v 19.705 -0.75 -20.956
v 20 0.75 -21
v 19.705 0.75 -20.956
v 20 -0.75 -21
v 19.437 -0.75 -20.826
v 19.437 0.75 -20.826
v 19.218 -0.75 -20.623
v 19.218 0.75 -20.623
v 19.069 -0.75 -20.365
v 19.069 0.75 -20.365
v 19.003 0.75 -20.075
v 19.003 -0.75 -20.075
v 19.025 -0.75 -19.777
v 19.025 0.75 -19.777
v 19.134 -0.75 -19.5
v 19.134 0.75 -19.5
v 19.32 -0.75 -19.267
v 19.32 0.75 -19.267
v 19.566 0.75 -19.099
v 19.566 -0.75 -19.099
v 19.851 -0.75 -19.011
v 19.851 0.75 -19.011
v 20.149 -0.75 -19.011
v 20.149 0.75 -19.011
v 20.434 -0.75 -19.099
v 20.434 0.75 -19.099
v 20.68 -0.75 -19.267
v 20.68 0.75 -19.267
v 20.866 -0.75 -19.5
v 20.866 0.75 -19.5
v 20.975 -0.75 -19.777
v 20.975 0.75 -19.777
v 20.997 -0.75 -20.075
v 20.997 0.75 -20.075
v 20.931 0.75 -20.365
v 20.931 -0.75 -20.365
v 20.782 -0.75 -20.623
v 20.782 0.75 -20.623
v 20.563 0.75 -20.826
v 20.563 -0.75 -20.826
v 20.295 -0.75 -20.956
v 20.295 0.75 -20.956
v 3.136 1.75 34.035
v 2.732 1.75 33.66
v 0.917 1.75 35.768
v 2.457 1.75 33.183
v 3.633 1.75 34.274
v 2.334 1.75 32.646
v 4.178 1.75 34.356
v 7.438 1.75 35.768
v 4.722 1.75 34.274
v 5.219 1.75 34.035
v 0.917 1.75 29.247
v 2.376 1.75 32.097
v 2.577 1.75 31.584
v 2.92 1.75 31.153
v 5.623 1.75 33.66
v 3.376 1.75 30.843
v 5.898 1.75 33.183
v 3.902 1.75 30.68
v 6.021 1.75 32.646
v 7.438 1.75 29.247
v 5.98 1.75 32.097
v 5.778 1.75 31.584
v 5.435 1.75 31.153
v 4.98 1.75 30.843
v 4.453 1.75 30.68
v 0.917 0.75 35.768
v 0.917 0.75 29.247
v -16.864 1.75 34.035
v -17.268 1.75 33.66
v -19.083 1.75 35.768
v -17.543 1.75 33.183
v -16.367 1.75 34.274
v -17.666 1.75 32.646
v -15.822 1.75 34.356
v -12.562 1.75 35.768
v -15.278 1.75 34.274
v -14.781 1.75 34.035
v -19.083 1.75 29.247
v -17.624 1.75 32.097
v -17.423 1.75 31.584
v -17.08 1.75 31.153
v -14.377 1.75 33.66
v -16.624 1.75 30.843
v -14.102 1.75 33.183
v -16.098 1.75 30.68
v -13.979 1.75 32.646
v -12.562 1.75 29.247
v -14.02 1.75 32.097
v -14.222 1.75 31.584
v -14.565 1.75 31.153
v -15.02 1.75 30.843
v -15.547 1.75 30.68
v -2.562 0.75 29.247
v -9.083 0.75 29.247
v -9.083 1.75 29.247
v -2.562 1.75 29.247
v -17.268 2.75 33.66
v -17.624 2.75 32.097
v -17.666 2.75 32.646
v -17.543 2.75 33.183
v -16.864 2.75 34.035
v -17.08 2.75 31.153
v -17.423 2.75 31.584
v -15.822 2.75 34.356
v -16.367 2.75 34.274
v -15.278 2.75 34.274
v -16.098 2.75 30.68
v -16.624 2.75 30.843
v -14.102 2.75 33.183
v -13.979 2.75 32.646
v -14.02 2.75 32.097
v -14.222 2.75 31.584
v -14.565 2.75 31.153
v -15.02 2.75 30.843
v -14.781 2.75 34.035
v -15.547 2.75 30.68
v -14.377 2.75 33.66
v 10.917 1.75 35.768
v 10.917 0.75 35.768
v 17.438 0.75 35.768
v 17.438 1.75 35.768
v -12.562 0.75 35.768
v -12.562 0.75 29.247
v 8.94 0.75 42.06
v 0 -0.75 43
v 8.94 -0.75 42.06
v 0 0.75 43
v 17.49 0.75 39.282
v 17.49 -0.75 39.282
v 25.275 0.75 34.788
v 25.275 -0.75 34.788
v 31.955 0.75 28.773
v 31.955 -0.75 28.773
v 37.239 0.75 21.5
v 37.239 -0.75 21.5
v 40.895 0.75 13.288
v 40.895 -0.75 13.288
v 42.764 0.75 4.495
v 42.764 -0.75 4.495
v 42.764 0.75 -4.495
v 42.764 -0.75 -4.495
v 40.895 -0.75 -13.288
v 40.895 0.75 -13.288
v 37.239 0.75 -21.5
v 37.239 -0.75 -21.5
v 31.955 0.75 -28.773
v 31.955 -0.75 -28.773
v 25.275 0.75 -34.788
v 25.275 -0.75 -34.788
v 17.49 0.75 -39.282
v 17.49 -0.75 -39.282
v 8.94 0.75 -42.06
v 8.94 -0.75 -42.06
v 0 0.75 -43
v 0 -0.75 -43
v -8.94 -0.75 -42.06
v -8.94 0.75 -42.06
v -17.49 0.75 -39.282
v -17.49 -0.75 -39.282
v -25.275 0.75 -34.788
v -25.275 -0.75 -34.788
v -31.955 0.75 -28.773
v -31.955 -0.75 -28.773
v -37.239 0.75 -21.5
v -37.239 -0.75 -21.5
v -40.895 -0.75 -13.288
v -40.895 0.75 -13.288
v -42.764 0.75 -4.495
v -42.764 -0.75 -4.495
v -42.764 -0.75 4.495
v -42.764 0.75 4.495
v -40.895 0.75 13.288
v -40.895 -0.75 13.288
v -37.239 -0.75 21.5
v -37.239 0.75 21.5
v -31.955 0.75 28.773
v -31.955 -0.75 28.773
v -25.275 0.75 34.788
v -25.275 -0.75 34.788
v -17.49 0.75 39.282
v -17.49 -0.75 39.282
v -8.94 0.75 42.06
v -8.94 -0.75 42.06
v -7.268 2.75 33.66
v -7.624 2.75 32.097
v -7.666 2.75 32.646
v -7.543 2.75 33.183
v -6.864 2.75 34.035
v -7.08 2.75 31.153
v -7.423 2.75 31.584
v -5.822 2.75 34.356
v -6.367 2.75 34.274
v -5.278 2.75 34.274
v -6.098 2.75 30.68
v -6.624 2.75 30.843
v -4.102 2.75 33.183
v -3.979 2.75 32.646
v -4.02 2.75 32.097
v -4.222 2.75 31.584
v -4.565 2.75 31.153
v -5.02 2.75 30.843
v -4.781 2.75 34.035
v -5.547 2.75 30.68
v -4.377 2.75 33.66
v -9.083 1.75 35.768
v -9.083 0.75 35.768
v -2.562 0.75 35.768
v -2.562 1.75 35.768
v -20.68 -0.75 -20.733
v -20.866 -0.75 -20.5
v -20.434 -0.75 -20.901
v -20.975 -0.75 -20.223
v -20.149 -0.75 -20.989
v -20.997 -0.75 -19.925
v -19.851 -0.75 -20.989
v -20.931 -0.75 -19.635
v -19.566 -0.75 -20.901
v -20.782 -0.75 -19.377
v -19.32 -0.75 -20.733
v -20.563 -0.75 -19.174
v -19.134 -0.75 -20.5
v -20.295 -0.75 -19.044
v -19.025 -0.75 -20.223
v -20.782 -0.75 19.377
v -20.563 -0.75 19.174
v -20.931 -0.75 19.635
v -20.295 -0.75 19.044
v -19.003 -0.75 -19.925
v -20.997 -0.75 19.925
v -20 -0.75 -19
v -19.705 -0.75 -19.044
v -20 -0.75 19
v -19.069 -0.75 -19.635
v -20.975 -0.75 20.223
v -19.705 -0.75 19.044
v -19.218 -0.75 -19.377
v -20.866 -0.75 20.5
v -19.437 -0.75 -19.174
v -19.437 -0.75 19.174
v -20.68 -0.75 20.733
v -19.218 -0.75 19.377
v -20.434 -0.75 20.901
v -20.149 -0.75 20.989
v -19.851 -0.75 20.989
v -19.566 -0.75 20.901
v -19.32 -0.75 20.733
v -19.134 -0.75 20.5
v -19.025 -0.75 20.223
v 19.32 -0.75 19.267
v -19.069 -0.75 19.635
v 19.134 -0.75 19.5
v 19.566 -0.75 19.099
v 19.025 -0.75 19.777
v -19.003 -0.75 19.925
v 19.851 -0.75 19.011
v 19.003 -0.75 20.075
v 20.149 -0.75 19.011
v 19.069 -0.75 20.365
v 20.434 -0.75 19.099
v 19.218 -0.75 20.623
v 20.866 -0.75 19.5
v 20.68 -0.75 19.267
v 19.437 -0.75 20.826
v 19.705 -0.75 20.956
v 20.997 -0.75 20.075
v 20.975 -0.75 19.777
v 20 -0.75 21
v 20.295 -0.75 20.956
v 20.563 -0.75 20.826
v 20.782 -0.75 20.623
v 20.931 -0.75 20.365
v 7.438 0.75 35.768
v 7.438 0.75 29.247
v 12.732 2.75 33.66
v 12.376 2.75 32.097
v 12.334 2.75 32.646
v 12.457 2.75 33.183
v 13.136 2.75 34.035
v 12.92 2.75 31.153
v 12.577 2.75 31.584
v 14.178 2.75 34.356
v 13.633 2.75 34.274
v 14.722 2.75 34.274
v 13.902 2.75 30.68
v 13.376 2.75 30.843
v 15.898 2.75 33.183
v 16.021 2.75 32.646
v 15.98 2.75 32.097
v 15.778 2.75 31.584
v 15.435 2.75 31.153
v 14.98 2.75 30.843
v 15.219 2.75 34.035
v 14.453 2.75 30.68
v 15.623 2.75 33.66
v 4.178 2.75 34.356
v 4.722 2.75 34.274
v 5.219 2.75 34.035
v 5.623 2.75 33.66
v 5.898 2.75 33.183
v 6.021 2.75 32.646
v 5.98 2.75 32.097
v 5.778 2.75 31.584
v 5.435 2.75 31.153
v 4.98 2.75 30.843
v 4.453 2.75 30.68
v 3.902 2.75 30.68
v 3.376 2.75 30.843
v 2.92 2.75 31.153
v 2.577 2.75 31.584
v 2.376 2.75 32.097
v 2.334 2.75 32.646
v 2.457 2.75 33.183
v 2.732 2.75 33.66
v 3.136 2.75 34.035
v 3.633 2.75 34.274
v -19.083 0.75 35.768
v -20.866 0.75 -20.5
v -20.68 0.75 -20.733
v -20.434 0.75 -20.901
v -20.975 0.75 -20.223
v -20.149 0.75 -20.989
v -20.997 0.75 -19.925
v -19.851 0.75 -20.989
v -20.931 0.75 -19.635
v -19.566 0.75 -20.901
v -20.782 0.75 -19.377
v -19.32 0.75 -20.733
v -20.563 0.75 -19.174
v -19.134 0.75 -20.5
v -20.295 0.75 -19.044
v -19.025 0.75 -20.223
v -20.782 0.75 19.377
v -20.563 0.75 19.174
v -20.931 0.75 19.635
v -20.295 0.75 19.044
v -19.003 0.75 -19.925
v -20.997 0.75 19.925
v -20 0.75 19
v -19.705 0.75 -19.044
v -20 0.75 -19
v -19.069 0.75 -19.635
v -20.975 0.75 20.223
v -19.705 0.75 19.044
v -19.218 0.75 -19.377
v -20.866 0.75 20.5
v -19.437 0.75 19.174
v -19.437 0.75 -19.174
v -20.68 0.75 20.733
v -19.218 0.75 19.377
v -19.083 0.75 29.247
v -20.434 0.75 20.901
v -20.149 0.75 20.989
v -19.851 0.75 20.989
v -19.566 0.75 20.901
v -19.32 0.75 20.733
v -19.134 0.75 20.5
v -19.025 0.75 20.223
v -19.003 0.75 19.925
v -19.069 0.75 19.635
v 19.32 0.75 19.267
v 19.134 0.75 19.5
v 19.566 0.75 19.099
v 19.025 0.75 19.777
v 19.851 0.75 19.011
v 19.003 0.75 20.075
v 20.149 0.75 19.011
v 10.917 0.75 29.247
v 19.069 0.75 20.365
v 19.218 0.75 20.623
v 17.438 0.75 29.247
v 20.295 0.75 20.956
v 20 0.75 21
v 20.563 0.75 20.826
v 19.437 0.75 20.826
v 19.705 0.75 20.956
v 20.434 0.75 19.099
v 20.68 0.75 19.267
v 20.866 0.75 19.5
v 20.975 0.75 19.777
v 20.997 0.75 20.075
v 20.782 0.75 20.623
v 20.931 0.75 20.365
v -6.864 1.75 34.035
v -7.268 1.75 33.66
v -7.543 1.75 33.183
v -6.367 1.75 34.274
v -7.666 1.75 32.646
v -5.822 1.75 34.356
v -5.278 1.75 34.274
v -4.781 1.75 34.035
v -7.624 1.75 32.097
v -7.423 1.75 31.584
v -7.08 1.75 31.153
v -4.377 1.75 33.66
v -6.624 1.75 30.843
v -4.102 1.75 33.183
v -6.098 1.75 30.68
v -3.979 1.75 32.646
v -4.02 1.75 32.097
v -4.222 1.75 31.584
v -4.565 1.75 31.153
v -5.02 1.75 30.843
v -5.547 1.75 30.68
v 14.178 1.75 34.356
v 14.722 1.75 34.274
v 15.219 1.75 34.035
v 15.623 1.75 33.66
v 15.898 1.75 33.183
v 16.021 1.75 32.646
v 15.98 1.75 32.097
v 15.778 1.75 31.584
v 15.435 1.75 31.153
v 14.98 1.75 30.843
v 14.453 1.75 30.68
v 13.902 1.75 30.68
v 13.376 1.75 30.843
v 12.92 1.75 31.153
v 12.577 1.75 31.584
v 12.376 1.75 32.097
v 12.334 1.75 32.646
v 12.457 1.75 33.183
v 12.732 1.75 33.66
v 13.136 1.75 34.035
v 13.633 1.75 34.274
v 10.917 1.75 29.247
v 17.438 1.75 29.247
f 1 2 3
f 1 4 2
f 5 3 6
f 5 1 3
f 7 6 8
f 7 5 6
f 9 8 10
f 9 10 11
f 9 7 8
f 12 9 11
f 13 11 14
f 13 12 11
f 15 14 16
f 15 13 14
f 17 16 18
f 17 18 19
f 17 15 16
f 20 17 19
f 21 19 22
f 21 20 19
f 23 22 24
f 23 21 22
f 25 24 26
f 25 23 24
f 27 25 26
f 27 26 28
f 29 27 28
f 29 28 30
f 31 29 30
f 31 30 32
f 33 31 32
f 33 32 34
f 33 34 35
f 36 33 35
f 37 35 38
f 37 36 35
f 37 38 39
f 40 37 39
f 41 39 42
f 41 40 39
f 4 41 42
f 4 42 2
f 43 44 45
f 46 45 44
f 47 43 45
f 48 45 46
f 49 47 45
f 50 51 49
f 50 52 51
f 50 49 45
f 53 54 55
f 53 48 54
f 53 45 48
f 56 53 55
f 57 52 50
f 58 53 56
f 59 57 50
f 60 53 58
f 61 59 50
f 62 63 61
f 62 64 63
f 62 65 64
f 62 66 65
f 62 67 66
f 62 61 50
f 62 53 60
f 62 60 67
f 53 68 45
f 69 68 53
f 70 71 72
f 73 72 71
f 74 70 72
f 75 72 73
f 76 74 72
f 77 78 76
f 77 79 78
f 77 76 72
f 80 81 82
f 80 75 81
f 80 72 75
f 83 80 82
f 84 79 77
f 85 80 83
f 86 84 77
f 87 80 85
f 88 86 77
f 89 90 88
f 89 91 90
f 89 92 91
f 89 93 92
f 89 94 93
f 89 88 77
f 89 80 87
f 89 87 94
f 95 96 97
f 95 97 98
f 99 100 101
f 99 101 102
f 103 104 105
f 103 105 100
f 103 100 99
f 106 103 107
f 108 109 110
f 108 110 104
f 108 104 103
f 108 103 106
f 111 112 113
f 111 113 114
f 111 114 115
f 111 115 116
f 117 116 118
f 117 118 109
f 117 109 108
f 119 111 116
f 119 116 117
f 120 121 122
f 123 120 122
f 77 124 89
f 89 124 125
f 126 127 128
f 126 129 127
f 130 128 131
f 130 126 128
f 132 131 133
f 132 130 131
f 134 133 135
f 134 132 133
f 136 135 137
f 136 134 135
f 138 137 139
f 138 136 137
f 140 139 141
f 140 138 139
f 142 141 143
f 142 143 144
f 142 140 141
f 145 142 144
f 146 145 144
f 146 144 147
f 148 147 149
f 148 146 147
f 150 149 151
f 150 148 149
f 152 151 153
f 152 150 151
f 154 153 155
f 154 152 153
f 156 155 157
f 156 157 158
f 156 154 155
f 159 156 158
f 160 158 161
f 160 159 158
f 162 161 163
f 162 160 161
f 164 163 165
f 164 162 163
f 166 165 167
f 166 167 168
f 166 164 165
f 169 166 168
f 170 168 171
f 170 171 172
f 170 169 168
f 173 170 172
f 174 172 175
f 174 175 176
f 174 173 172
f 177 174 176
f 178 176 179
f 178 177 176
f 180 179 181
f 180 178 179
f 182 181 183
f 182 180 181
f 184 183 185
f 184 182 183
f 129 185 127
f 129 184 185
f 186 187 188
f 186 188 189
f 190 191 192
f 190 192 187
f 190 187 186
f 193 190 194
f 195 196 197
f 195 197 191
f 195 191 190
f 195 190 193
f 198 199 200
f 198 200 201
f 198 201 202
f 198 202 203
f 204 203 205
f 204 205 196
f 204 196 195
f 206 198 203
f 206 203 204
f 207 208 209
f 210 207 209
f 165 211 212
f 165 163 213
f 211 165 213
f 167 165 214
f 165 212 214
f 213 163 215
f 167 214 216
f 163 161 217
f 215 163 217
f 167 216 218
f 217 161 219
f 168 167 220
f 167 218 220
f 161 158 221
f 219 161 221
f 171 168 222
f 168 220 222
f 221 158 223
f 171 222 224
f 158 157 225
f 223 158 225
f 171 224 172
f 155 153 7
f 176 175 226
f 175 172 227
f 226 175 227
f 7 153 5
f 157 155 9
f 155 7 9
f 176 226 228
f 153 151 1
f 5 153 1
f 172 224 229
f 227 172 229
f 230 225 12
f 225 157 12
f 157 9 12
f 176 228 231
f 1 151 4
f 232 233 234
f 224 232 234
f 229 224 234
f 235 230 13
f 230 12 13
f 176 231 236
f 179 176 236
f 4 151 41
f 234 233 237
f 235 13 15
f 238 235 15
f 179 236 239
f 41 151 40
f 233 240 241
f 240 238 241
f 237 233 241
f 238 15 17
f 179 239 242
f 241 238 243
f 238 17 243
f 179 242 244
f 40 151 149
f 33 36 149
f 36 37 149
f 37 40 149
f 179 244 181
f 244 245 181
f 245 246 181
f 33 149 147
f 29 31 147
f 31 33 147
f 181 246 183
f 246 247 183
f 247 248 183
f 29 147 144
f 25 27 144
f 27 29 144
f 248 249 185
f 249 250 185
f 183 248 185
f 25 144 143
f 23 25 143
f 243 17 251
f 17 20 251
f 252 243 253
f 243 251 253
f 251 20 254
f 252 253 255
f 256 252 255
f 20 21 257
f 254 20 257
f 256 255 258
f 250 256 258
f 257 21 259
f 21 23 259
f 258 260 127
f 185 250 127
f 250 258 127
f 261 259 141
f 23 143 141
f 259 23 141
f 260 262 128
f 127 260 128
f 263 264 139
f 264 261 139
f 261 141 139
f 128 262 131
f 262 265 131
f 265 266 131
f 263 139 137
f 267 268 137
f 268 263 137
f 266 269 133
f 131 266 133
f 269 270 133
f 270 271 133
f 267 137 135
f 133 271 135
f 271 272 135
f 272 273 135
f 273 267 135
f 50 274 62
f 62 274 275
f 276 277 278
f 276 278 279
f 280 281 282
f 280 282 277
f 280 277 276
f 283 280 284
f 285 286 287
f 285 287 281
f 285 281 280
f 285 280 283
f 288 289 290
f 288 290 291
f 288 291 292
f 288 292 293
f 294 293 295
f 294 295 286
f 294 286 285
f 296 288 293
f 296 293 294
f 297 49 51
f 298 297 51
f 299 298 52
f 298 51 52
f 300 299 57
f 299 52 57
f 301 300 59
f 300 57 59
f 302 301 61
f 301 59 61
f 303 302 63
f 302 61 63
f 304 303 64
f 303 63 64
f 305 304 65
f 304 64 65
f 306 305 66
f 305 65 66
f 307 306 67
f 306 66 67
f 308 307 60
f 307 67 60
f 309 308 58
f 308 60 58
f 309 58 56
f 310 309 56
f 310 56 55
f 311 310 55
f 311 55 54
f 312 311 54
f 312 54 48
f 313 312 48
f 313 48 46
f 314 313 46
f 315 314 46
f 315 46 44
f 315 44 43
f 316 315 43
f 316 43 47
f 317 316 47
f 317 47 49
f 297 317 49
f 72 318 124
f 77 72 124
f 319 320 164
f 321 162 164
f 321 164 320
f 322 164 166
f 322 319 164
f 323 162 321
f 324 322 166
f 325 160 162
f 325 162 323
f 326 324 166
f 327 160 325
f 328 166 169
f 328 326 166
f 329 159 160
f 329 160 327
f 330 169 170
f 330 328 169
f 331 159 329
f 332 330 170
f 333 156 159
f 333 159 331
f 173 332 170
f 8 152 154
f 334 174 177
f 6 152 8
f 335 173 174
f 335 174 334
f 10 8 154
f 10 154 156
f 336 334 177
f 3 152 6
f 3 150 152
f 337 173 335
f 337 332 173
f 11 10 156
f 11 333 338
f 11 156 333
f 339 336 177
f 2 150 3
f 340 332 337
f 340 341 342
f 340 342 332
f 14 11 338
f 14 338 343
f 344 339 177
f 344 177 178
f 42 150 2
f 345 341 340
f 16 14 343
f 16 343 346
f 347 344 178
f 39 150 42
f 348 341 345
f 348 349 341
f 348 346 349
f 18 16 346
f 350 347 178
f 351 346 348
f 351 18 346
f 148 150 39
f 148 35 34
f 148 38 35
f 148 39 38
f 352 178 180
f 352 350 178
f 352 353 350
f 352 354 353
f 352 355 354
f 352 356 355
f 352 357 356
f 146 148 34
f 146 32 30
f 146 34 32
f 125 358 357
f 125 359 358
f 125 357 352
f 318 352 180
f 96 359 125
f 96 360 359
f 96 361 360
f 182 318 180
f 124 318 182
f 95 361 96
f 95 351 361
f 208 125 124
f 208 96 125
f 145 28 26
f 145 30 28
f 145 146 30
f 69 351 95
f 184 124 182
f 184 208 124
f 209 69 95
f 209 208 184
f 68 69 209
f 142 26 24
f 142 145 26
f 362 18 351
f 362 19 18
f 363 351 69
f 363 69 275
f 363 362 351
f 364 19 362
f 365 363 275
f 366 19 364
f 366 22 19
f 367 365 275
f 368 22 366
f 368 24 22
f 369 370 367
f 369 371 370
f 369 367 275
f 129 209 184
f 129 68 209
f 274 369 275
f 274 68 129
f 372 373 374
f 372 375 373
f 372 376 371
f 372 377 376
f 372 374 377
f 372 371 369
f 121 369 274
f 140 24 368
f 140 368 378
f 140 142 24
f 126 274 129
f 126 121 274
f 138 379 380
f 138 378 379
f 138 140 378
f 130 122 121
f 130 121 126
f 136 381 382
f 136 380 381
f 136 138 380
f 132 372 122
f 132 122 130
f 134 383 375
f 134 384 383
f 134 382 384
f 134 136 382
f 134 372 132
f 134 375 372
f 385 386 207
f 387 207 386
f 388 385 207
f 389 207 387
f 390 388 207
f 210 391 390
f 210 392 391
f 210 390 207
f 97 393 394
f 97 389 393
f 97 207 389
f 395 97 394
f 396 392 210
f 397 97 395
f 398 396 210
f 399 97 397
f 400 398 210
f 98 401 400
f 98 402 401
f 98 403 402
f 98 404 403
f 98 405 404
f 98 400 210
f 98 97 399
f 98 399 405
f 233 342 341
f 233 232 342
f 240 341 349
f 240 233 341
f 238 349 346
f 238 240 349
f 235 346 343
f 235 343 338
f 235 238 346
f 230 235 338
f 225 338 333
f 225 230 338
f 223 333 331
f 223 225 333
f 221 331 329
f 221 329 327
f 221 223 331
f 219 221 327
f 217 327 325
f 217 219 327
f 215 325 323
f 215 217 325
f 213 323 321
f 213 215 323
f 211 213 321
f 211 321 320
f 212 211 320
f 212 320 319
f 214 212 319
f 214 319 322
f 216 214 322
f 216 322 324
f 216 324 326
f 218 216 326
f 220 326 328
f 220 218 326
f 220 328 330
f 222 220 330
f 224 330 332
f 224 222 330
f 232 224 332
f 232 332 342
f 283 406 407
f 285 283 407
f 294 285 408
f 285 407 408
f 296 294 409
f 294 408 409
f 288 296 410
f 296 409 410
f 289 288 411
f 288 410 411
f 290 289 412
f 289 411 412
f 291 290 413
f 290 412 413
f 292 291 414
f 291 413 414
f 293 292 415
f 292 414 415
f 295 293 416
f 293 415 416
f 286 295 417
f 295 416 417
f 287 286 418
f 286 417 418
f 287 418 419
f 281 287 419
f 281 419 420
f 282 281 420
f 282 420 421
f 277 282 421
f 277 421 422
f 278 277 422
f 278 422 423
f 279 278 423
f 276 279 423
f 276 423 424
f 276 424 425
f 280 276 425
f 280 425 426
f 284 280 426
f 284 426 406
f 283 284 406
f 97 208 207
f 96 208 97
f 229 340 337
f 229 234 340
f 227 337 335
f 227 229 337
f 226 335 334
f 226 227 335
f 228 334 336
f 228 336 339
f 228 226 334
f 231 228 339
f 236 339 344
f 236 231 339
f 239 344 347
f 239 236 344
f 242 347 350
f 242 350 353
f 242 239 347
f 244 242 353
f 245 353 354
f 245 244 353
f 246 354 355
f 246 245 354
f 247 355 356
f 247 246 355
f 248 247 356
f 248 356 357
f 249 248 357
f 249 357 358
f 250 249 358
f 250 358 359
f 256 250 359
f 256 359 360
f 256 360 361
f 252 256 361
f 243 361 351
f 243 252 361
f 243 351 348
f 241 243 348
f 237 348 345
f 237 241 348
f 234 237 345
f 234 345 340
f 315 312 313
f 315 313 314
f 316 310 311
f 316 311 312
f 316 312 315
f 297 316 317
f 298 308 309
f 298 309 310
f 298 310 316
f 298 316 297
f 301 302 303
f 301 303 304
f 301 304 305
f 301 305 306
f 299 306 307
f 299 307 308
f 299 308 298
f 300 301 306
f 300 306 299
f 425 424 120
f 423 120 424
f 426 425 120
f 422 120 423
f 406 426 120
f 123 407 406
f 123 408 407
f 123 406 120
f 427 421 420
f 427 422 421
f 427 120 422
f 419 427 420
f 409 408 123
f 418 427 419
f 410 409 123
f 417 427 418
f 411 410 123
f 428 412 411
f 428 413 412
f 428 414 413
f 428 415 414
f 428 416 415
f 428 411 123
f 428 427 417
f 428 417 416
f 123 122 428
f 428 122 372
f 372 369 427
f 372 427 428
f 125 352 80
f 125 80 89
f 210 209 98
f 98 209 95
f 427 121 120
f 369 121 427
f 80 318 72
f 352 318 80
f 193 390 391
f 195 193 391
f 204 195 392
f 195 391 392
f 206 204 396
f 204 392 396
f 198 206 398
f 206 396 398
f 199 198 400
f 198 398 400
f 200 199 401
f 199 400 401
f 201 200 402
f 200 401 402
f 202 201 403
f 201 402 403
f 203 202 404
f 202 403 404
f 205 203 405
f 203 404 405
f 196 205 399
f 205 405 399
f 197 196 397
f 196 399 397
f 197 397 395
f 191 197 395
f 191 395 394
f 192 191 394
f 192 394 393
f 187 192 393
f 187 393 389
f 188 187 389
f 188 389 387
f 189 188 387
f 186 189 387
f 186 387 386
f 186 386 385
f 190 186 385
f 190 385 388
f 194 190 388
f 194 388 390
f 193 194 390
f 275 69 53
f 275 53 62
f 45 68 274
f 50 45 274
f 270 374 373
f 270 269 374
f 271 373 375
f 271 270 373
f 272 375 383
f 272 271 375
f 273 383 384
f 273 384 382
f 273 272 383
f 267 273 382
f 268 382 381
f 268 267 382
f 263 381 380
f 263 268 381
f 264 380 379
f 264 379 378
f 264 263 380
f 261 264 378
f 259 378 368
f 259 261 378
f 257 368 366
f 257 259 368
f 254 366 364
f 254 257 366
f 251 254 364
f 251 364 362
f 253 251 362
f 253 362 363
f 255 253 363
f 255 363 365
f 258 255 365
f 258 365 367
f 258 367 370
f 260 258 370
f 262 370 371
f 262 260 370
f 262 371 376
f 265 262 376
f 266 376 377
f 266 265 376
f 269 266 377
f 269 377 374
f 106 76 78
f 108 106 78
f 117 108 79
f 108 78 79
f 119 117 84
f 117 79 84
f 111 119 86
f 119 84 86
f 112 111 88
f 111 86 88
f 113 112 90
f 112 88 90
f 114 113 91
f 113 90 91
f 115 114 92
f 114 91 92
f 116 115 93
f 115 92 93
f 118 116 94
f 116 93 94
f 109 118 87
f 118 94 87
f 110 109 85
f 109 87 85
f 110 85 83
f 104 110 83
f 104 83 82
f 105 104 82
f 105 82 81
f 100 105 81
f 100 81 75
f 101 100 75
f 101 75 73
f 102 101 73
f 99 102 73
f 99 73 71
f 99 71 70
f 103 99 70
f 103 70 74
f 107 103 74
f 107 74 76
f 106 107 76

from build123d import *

# Parameters (mm, degrees)
SKETCH_1_R             = 43
SKETCH_1_R_2           = 1
EXTRUDE_1_DEPTH        = 0.75
SKETCH_3_W             = 6.520751419
SKETCH_3_H             = 6.52075142
SKETCH_3_R             = 1.848339335
EXTRUDE_2_DEPTH        = 1
SKETCH_3_3_R           = 1.848339335
EXTRUDE_3_DEPTH        = 2
PATTERN_LINEAR_1_COUNT = 4
PATTERN_LINEAR_1_PITCH = 10


with BuildPart() as part:
    # 草图1 → 凸台-拉伸1 (new, symmetric)
    with BuildSketch(Plane(origin=(0, 0, 0), x_dir=(1, 0, 0), z_dir=(0, 1, 0))):
        Circle(SKETCH_1_R)
        with Locations((-20, 20)):
            Circle(SKETCH_1_R_2, mode=Mode.SUBTRACT)
        with Locations((-20, -20)):
            Circle(SKETCH_1_R_2, mode=Mode.SUBTRACT)
        with Locations((20, -20)):
            Circle(SKETCH_1_R_2, mode=Mode.SUBTRACT)
        with Locations((20, 20)):
            Circle(SKETCH_1_R_2, mode=Mode.SUBTRACT)
    extrude(amount=EXTRUDE_1_DEPTH, both=True)

    # 草图3 → 凸台-拉伸2 (add)
    with BuildSketch(Plane(origin=(0, 0.75, 0), x_dir=(1, 0, 0), z_dir=(0, 1, 0))):
        with Locations((-15.822411534, -32.507863696)):
            Rectangle(SKETCH_3_W, SKETCH_3_H)
        with Locations((-15.822411533, -32.507863696)):
            Circle(SKETCH_3_R, mode=Mode.SUBTRACT)
    extrude_2 = extrude(amount=EXTRUDE_2_DEPTH)

    # 草图3<3> → 凸台-拉伸3 (add)
    with BuildSketch(Plane(origin=(0, 0.75, 0), x_dir=(1, 0, 0), z_dir=(0, 1, 0))):
        with Locations((-15.822411533, -32.507863696)):
            Circle(SKETCH_3_3_R)
    extrude_3 = extrude(amount=EXTRUDE_3_DEPTH)

    # 阵列(线性)1: 凸台-拉伸2, 凸台-拉伸3 ×4
    with Locations(*[(i * PATTERN_LINEAR_1_PITCH, 0, 0) for i in range(1, PATTERN_LINEAR_1_COUNT)]):
        add(extrude_2)
        add(extrude_3)


solid = part.part
